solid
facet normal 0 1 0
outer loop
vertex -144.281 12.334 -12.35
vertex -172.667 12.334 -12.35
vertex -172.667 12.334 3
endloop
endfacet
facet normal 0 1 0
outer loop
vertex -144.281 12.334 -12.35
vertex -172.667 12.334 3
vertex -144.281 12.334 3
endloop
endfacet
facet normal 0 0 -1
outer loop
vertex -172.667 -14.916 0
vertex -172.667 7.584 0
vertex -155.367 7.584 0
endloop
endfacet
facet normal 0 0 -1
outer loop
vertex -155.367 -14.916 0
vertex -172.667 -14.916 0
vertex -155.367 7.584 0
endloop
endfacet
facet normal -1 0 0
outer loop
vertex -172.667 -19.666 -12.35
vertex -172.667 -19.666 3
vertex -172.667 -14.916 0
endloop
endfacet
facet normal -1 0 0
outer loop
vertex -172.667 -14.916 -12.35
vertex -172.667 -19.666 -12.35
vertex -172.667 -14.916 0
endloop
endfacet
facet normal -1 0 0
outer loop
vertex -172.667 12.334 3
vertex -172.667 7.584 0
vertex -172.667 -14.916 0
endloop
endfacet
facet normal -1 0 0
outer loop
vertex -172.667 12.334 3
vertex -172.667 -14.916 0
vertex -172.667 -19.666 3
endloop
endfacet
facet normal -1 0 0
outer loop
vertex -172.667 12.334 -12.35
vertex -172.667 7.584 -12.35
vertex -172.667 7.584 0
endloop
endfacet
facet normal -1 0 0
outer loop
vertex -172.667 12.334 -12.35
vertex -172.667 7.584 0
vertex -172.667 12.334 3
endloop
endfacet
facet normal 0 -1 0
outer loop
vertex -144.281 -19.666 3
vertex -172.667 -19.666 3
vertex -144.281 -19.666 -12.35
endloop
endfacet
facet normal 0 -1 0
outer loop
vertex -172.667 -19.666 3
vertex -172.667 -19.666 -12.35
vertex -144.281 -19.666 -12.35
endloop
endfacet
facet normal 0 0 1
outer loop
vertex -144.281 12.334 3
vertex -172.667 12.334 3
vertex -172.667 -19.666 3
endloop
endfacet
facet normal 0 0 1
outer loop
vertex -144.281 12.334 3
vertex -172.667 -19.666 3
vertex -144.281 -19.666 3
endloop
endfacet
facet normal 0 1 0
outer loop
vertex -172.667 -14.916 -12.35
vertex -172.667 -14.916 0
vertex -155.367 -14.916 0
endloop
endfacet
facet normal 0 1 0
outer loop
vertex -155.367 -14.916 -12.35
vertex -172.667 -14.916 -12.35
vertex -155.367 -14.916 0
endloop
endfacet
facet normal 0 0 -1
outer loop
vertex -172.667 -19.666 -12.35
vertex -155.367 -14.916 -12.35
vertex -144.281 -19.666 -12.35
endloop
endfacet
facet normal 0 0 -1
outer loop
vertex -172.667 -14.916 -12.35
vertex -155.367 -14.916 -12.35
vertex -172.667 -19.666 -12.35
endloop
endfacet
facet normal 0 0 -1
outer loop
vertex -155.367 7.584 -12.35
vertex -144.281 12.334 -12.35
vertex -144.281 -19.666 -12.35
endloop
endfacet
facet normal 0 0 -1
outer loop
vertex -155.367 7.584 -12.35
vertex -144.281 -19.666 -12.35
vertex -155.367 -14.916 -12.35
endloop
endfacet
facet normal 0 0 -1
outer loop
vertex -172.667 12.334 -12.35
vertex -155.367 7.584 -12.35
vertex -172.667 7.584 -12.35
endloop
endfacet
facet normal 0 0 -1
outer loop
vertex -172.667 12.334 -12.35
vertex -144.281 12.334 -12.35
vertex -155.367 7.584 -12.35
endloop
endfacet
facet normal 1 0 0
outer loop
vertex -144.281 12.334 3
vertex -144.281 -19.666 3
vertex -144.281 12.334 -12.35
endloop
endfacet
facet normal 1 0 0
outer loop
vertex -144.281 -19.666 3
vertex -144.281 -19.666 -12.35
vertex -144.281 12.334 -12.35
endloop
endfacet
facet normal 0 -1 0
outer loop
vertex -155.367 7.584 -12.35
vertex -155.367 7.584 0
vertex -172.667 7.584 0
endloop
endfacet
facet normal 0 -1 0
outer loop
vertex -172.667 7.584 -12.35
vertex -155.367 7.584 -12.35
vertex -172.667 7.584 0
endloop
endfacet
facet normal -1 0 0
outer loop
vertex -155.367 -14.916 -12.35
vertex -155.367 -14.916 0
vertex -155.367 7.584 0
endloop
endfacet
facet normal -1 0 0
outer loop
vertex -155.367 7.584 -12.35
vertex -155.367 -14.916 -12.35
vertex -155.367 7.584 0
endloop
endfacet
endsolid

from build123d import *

# Parameters (mm, degrees)
BOSS_EXTRUDE1_DEPTH = 12.35
SKETCH2_W           = 28.386130872
SKETCH2_H           = 32
BOSS_EXTRUDE2_DEPTH = 3


with BuildPart() as part:
    # Sketch1 → Boss-Extrude1 (new body)
    with BuildSketch(Plane.XY):
        Polygon((-155.366706922, 7.584180911), (-172.666706922, 7.584180911), (-172.666706922, 12.334180911), (-144.28057605, 12.334180911), (-144.28057605, -19.665819089), (-172.666706922, -19.665819089), (-172.666706922, -14.915819089), (-155.366706922, -14.915819089), align=None)
    extrude(amount=-BOSS_EXTRUDE1_DEPTH)

    # Sketch2 → Boss-Extrude2 (add)
    with BuildSketch(Plane.XY):
        with Locations((-158.473641486, -3.665819089)):
            Rectangle(SKETCH2_W, SKETCH2_H)
    extrude(amount=BOSS_EXTRUDE2_DEPTH)


solid = part.part
